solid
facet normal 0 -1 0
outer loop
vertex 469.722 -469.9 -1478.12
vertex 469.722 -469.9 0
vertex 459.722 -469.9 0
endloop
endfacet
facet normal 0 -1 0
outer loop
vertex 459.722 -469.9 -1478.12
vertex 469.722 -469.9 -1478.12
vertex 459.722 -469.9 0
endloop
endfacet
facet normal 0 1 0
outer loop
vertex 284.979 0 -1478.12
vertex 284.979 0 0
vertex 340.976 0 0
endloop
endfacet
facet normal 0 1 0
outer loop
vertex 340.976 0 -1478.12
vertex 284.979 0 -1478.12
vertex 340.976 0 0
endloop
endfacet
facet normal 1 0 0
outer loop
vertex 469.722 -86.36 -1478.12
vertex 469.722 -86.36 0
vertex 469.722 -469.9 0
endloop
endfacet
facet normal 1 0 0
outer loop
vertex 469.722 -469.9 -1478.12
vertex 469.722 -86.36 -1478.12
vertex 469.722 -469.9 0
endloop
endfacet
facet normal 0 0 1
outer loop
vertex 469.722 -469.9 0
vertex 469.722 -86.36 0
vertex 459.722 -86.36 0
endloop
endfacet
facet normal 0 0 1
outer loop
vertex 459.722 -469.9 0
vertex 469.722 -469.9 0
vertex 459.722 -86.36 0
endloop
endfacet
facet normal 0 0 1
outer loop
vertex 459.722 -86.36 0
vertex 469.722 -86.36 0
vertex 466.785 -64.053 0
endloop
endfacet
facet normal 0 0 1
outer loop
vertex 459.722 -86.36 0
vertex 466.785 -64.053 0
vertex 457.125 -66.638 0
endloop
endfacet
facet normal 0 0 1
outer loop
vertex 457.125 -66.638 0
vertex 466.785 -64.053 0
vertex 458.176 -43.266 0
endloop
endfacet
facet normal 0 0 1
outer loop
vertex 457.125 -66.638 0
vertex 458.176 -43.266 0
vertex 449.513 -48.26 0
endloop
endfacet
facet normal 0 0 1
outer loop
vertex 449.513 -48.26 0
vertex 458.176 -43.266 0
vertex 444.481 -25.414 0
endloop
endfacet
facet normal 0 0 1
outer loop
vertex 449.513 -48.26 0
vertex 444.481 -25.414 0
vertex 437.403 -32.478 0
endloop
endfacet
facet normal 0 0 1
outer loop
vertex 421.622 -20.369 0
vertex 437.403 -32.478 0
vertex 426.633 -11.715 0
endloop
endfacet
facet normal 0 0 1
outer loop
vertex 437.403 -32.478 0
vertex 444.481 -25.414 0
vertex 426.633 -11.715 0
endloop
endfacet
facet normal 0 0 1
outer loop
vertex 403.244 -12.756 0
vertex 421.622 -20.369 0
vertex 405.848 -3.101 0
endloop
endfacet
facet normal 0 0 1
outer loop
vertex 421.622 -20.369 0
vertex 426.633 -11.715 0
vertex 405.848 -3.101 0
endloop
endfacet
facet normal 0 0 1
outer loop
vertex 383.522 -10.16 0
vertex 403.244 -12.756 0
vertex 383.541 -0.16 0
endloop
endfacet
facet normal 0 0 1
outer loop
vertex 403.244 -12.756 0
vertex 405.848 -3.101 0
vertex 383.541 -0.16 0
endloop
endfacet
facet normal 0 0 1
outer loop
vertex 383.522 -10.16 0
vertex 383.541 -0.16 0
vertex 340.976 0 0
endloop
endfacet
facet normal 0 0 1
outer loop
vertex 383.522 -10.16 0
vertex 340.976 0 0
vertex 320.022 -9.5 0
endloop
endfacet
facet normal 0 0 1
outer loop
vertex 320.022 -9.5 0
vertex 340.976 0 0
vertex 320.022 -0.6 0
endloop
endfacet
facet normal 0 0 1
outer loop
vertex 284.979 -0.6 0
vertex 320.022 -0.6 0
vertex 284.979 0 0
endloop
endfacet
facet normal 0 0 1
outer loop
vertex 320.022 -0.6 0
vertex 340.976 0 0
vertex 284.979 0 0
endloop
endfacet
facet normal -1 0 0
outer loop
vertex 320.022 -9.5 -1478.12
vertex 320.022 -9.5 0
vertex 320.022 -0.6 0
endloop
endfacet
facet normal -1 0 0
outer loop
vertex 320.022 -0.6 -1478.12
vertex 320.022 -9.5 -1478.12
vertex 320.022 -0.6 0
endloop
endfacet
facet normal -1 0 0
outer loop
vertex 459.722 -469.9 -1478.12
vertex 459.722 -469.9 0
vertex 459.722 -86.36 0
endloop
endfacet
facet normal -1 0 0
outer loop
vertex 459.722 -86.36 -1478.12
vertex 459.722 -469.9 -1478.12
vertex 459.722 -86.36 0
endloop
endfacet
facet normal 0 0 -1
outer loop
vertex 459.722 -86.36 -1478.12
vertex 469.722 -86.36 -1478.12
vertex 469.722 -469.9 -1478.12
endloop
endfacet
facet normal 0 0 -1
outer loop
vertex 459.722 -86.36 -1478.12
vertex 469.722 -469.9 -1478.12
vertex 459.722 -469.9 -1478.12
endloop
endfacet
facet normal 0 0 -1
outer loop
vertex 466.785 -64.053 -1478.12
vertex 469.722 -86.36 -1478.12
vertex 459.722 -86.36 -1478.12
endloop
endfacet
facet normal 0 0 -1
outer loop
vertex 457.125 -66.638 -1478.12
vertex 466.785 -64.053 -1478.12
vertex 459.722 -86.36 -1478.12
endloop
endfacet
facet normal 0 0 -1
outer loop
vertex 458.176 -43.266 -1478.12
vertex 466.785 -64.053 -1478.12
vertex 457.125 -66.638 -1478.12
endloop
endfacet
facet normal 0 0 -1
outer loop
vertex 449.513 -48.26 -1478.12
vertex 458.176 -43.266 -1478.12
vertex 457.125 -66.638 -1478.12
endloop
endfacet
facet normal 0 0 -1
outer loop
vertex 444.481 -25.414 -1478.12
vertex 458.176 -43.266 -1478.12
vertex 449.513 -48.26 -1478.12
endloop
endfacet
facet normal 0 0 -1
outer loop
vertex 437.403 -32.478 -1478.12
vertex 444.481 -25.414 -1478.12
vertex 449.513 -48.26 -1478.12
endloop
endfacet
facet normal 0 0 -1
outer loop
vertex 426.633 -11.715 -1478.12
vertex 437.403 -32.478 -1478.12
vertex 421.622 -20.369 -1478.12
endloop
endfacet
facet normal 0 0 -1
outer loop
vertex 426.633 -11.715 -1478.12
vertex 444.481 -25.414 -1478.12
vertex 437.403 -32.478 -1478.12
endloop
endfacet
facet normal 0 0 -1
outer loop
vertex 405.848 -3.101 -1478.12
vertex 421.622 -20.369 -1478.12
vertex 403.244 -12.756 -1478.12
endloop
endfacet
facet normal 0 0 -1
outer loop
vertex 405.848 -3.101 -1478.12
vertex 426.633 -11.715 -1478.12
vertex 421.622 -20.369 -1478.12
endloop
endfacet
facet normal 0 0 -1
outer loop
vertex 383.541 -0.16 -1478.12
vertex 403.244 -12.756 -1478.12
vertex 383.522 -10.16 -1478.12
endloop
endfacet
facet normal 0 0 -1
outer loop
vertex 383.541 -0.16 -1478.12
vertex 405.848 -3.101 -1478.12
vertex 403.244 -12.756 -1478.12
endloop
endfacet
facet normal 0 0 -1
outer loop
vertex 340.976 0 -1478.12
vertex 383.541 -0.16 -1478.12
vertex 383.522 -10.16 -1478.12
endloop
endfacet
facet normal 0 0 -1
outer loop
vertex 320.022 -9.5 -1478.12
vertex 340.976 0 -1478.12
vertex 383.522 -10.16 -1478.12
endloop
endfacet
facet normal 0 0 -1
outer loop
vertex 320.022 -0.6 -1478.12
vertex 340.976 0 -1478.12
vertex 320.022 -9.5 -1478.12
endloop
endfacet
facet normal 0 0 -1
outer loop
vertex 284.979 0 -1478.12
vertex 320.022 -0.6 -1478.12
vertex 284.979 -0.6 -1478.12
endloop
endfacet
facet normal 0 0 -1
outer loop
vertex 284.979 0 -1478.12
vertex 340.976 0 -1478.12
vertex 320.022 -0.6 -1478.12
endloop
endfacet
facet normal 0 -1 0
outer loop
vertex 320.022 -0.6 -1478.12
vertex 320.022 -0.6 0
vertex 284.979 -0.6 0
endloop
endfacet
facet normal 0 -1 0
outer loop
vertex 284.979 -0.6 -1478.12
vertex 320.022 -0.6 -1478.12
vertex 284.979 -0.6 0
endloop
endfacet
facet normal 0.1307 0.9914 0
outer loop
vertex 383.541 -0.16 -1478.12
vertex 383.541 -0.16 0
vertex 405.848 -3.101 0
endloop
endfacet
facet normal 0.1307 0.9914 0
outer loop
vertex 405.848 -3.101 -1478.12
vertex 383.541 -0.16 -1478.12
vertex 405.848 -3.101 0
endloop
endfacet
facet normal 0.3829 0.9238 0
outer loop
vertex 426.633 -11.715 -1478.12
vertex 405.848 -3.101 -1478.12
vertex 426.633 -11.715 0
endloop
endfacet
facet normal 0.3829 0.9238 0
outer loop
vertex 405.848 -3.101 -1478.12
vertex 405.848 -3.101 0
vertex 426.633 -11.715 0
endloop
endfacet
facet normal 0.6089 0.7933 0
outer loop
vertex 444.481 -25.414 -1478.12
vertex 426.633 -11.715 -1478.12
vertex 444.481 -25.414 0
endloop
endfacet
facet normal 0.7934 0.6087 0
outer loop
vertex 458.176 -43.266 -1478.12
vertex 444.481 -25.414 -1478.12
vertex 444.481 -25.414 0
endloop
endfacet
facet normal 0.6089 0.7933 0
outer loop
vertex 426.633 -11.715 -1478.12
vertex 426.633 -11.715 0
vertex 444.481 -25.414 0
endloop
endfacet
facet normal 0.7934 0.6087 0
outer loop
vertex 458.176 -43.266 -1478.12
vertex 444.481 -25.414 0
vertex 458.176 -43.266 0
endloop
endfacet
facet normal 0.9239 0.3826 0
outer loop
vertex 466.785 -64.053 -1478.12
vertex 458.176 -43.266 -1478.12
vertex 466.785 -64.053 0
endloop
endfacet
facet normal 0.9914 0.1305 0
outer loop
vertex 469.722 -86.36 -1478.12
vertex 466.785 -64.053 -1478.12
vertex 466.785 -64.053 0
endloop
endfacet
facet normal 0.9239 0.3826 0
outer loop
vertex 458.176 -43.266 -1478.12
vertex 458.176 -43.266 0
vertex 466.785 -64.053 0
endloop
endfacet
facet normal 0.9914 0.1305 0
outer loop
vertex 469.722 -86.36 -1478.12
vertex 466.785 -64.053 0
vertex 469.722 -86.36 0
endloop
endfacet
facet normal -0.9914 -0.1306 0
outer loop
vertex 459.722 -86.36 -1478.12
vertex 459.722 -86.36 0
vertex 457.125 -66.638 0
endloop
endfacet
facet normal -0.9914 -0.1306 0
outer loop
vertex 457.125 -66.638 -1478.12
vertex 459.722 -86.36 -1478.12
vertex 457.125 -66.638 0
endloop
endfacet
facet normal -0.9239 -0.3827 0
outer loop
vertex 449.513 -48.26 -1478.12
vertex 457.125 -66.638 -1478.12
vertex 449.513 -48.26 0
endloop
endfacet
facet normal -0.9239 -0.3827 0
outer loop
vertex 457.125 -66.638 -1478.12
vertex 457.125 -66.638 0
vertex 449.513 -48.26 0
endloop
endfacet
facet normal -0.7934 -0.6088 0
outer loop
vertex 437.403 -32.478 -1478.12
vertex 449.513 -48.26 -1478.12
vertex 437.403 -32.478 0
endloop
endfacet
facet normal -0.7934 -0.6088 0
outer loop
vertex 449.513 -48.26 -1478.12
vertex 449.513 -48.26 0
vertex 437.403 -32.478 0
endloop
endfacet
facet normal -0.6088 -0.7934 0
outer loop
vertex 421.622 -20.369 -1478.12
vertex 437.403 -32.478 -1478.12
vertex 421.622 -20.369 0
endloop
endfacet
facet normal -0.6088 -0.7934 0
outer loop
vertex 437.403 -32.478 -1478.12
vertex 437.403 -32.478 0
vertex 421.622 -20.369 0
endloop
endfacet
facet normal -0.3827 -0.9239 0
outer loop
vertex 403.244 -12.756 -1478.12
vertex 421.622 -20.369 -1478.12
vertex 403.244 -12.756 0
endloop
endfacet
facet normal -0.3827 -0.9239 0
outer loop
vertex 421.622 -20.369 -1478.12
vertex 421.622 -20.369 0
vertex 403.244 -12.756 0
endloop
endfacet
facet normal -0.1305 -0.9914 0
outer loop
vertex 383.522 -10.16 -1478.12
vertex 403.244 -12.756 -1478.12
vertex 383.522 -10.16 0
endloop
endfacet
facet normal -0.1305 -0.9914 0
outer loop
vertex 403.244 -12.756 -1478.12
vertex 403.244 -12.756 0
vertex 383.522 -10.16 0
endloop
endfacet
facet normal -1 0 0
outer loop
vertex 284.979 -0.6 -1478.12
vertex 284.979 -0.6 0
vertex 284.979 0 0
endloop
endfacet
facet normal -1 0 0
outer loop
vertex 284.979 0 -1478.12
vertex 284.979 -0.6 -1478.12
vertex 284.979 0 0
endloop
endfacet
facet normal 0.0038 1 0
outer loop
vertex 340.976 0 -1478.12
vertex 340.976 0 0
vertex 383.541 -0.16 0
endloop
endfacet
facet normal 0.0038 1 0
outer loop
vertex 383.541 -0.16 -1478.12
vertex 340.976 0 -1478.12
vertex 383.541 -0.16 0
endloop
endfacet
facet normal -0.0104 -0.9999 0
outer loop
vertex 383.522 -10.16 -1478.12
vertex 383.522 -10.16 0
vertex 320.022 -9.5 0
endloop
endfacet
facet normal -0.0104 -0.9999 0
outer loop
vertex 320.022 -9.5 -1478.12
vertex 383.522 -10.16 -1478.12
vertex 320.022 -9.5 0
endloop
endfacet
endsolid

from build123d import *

# Parameters (mm, degrees)
BOSS_EXTRUDE1_DEPTH = 1478.120000035


with BuildPart() as part:
    # Sketch1 → Boss-Extrude1 (new body)
    with BuildSketch(Plane.XY):
        with BuildLine():
            Line((459.721789204, -469.9), (459.721789204, -86.36))
            ThreePointArc((459.721789204, -86.36), (437.403325931, -32.478463274), (383.521789204, -10.16))
            Line((383.521789204, -10.16), (320.021789204, -9.5))
            Line((320.021789204, -9.5), (320.021789204, -0.6))
            Line((320.021789204, -0.6), (284.979491485, -0.6))
            Line((284.979491485, -0.6), (284.979491485, 0))
            Line((284.979491485, 0), (340.976408313, 0))
            Line((340.976408313, 0), (383.5411635, -0.160002177))
            ThreePointArc((383.5411635, -0.160002177), (444.481243206, -25.414245695), (469.721789204, -86.36))
            Line((469.721789204, -86.36), (469.721789204, -469.9))
            Line((469.721789204, -469.9), (459.721789204, -469.9))
        make_face()
    extrude(amount=-BOSS_EXTRUDE1_DEPTH)


solid = part.part
